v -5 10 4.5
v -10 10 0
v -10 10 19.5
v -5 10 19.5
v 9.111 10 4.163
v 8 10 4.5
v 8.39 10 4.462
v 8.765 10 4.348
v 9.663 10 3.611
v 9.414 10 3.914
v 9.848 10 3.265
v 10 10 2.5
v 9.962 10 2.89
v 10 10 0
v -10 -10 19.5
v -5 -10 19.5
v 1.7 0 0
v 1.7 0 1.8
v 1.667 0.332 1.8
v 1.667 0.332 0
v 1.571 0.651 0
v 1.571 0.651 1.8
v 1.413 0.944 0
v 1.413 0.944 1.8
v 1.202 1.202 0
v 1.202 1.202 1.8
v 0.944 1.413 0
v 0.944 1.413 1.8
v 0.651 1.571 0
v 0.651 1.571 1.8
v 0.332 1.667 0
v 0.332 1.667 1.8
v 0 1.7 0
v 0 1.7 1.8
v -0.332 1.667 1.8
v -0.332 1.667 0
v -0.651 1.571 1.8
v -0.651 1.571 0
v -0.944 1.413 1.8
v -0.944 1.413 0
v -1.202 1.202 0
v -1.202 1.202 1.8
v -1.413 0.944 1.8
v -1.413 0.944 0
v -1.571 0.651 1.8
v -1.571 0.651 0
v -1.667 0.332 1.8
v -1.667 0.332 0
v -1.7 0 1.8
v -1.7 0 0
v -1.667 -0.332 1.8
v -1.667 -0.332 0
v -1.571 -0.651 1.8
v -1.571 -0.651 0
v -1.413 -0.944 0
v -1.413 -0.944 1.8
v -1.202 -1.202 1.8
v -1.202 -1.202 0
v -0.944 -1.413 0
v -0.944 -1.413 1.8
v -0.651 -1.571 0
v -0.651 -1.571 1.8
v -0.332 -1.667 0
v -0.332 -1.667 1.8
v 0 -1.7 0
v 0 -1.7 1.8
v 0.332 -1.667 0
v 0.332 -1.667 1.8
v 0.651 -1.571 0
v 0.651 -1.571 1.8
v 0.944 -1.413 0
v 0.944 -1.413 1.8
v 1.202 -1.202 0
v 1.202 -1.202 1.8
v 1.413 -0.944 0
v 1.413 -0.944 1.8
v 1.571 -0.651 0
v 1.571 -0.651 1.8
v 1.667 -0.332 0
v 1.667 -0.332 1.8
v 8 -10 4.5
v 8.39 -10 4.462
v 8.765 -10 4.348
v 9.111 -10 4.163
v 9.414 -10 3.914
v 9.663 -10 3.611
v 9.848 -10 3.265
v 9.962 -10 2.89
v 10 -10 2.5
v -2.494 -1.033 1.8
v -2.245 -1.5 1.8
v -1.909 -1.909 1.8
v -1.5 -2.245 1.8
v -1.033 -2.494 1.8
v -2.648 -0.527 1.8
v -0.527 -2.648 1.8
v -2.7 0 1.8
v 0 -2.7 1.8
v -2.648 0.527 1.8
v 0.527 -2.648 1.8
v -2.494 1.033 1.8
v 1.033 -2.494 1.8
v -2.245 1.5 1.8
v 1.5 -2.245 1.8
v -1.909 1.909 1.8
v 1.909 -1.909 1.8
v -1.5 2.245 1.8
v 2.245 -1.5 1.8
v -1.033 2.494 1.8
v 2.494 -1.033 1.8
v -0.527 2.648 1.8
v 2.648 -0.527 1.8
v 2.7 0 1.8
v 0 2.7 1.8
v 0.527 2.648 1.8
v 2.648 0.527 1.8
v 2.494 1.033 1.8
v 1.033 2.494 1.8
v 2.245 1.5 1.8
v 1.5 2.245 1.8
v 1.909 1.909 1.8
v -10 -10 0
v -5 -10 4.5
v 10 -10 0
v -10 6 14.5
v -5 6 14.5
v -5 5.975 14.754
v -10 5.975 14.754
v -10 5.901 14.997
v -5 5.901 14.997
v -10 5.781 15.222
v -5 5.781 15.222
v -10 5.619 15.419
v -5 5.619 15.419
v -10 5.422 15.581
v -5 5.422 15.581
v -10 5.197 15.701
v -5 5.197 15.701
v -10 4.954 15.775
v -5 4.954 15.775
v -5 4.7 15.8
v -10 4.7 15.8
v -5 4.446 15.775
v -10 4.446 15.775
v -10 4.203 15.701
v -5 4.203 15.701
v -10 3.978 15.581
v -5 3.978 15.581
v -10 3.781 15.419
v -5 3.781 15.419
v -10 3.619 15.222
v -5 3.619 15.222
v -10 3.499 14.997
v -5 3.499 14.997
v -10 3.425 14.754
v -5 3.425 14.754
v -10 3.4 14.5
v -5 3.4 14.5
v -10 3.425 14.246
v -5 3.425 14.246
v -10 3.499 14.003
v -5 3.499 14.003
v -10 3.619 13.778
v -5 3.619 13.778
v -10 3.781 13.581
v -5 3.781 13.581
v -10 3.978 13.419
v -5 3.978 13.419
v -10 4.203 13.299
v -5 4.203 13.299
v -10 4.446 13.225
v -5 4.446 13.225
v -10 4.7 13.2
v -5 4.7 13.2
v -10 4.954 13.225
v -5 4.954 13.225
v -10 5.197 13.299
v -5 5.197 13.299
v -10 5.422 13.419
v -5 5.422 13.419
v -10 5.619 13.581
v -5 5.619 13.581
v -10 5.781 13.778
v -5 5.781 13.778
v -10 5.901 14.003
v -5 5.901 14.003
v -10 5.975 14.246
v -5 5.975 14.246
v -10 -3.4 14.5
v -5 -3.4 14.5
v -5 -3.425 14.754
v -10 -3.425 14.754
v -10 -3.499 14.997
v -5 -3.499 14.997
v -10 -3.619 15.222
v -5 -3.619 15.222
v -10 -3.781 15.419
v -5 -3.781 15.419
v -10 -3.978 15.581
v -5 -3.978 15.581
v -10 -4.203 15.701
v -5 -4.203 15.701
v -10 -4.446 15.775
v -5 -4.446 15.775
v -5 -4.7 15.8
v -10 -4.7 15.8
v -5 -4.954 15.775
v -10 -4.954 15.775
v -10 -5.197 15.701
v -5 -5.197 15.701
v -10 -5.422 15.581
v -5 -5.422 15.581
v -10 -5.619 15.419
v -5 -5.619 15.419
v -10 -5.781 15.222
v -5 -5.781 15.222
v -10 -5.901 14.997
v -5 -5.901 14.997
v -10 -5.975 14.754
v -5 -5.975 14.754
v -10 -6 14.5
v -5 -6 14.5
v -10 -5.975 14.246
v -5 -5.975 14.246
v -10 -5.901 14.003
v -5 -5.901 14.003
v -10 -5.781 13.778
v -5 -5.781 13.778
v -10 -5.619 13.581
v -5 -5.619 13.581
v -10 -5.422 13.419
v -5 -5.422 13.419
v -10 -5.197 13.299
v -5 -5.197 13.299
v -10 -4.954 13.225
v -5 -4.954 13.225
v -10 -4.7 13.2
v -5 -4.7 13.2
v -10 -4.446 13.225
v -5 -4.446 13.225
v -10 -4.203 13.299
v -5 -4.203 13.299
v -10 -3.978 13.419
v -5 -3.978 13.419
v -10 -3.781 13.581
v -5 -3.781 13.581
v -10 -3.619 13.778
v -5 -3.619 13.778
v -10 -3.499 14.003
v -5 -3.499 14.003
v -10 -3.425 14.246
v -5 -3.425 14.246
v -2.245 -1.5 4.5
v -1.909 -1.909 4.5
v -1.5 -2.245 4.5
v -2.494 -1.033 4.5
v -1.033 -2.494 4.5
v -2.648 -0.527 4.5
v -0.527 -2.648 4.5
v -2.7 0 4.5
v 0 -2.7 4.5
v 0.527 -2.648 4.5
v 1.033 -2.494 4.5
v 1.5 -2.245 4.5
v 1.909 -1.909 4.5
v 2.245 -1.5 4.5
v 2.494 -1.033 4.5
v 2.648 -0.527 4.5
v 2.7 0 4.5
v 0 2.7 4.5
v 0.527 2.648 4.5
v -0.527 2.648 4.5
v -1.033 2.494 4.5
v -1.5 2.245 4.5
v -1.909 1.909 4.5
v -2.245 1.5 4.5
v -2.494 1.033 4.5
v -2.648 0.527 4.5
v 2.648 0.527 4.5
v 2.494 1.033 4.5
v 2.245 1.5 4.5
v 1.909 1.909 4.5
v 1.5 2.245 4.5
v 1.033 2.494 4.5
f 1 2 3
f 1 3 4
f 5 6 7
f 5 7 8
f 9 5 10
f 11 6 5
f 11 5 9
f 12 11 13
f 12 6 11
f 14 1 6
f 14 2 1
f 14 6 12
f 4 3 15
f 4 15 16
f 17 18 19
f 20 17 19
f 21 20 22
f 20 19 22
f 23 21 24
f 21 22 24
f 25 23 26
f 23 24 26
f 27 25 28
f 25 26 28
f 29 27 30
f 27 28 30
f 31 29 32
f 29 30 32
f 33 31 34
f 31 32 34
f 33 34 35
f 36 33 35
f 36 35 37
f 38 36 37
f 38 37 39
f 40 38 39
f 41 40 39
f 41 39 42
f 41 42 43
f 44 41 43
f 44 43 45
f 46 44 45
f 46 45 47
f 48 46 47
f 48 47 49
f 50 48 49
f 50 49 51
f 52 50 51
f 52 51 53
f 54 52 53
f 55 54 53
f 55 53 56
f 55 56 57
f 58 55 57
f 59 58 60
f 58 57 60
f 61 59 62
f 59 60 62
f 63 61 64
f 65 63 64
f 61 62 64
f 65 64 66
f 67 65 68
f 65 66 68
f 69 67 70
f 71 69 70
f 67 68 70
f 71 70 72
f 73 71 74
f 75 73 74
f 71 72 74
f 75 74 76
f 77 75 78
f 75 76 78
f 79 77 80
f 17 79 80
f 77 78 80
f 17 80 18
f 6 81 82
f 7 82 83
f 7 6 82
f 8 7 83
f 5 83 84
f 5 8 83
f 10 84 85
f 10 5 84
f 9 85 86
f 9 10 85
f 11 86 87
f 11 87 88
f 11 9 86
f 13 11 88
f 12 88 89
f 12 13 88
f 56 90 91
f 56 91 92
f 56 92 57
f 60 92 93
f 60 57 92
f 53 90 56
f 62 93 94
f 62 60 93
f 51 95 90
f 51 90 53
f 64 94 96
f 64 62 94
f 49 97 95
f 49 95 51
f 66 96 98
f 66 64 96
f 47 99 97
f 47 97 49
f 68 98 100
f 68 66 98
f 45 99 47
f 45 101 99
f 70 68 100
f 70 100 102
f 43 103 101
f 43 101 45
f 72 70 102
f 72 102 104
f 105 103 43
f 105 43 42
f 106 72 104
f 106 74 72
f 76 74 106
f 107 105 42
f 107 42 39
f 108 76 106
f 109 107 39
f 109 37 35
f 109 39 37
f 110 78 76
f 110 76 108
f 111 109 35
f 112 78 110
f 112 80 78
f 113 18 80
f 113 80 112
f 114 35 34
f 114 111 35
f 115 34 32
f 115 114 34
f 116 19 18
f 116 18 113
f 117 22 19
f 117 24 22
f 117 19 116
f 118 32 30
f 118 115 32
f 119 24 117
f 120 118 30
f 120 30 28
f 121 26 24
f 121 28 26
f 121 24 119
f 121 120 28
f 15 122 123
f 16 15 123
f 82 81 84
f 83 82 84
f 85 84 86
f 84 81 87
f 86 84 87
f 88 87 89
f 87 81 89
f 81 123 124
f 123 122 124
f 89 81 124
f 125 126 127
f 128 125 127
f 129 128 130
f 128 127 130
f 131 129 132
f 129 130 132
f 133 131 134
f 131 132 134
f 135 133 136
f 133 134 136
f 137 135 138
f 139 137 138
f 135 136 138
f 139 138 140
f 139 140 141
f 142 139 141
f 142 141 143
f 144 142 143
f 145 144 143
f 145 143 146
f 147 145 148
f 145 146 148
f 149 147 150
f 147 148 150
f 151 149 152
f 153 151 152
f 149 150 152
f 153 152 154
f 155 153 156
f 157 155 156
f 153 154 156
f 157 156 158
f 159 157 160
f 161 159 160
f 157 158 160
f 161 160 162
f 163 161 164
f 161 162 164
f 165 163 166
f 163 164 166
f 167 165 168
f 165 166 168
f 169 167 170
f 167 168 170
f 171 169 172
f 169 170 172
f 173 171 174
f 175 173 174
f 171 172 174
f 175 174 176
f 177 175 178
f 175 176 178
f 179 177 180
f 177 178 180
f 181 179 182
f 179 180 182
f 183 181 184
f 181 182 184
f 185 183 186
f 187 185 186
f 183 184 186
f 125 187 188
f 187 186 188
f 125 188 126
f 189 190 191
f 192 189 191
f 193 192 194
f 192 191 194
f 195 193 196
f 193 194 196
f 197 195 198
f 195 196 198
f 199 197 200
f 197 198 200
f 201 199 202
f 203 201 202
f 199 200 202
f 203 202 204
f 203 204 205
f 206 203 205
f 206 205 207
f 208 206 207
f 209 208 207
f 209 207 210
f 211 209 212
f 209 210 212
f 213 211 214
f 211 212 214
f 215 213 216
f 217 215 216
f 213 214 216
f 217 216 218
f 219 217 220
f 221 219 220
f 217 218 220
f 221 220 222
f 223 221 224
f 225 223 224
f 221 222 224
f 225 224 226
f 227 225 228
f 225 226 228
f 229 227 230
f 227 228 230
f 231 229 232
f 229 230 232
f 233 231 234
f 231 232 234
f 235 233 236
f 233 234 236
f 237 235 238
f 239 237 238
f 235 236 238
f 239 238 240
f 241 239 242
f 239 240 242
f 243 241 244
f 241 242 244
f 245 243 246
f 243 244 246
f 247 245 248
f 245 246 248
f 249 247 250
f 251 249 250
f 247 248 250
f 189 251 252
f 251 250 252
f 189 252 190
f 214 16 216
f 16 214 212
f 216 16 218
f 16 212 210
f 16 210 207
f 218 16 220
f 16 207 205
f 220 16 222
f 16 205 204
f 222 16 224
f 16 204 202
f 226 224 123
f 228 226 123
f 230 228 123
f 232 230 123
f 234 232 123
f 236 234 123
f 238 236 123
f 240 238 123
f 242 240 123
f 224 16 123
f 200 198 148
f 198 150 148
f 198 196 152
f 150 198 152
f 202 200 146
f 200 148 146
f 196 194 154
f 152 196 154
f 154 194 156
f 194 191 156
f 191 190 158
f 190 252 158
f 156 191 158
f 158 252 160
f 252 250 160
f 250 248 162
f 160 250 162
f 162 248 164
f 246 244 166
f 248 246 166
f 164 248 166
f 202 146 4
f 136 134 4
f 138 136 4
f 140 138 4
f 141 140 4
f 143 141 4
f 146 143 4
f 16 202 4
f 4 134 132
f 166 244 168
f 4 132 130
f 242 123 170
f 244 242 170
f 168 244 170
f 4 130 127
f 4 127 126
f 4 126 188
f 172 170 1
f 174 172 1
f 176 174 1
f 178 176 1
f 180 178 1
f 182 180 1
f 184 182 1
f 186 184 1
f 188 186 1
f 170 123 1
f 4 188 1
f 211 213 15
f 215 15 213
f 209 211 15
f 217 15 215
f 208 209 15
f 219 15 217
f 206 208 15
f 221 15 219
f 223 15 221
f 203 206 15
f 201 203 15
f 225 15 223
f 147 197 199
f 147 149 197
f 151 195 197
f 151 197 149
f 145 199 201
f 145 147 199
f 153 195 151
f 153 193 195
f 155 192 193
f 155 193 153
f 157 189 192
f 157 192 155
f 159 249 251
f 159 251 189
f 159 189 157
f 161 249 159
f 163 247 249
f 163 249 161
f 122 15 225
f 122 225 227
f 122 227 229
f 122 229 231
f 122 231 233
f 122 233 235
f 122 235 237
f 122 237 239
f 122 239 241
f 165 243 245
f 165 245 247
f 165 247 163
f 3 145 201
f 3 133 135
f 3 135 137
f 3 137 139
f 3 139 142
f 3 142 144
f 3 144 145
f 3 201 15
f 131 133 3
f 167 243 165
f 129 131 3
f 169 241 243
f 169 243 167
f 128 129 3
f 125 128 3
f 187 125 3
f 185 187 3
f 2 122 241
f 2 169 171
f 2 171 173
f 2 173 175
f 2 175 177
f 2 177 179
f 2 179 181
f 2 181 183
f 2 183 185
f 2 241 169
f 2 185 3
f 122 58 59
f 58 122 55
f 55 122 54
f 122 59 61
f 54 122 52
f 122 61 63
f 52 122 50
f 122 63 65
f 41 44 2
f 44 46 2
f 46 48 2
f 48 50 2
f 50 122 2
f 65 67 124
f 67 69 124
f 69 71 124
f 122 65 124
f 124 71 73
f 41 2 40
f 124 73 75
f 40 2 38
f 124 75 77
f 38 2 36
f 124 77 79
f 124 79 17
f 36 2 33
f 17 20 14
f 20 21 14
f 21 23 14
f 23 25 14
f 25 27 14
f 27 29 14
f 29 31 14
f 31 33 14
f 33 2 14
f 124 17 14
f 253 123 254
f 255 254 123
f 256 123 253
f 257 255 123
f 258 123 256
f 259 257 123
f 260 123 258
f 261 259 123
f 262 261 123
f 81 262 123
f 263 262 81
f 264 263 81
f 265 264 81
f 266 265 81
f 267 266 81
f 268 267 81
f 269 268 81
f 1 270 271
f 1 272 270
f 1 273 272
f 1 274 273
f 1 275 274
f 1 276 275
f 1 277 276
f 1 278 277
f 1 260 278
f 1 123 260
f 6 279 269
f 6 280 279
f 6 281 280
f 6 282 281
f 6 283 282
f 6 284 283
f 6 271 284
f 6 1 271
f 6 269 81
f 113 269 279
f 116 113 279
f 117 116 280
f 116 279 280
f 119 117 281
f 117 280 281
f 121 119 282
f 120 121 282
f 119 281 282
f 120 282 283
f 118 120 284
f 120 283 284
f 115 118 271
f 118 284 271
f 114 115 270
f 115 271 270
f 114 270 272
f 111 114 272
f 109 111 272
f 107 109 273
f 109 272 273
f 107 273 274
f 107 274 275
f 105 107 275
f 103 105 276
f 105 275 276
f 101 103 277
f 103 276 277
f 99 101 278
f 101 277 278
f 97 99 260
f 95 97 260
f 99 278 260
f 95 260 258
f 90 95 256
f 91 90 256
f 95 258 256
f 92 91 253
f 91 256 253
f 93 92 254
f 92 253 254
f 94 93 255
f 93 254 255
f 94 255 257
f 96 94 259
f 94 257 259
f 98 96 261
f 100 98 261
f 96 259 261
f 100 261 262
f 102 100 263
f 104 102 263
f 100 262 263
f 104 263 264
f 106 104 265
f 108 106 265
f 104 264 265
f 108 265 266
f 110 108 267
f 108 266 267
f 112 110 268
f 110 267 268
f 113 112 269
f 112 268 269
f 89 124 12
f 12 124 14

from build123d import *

# Parameters (mm, degrees)
SKETCH_W        = 20
SKETCH_H        = 20
PAD_DEPTH       = 4.5
SKETCH001_R     = 1.7
POCKET_DEPTH    = 5
SKETCH002_R     = 2.7
POCKET001_DEPTH = 2.7
SKETCH003_W     = 5
SKETCH003_H     = 20
PAD001_DEPTH    = 15
SKETCH004_R     = 1.3
POCKET002_DEPTH = 5
FILLET_R        = 2


with BuildPart() as part:
    # Sketch → Pad (new body)
    with BuildSketch(Plane.XY):
        Rectangle(SKETCH_W, SKETCH_H)
    extrude(amount=PAD_DEPTH)

    # Sketch001 (on Face6 of Pad) → Pocket (cut)
    with BuildSketch(Plane.XY.offset(4.5)):
        Circle(SKETCH001_R)
    extrude(amount=-POCKET_DEPTH, mode=Mode.SUBTRACT)

    # Sketch002 (on Face5 of Pocket) → Pocket001 (cut)
    with BuildSketch(Plane.XY.offset(4.5)):
        Circle(SKETCH002_R)
    extrude(amount=-POCKET001_DEPTH, mode=Mode.SUBTRACT)

    # Sketch003 (on Face5 of Pocket001) → Pad001 (join)
    with BuildSketch(Plane.XY.offset(4.5)):
        with Locations((-7.5, 0)):
            Rectangle(SKETCH003_W, SKETCH003_H)
    extrude(amount=PAD001_DEPTH)

    # Sketch004 (on Face10 of Pad001) → Pocket002 (cut)
    with BuildSketch(Plane.YZ.offset(-5)):
        with Locations((-4.7, 14.5)):
            Circle(SKETCH004_R)
        with Locations((4.7, 14.5)):
            Circle(SKETCH004_R)
    extrude(amount=-POCKET002_DEPTH, mode=Mode.SUBTRACT)

    # Fillet
    fillet_edges = [part.edges().sort_by_distance(p)[0] for p in [
        (10, 0, 4.5),
    ]]
    fillet(fillet_edges, radius=FILLET_R)


solid = part.part
